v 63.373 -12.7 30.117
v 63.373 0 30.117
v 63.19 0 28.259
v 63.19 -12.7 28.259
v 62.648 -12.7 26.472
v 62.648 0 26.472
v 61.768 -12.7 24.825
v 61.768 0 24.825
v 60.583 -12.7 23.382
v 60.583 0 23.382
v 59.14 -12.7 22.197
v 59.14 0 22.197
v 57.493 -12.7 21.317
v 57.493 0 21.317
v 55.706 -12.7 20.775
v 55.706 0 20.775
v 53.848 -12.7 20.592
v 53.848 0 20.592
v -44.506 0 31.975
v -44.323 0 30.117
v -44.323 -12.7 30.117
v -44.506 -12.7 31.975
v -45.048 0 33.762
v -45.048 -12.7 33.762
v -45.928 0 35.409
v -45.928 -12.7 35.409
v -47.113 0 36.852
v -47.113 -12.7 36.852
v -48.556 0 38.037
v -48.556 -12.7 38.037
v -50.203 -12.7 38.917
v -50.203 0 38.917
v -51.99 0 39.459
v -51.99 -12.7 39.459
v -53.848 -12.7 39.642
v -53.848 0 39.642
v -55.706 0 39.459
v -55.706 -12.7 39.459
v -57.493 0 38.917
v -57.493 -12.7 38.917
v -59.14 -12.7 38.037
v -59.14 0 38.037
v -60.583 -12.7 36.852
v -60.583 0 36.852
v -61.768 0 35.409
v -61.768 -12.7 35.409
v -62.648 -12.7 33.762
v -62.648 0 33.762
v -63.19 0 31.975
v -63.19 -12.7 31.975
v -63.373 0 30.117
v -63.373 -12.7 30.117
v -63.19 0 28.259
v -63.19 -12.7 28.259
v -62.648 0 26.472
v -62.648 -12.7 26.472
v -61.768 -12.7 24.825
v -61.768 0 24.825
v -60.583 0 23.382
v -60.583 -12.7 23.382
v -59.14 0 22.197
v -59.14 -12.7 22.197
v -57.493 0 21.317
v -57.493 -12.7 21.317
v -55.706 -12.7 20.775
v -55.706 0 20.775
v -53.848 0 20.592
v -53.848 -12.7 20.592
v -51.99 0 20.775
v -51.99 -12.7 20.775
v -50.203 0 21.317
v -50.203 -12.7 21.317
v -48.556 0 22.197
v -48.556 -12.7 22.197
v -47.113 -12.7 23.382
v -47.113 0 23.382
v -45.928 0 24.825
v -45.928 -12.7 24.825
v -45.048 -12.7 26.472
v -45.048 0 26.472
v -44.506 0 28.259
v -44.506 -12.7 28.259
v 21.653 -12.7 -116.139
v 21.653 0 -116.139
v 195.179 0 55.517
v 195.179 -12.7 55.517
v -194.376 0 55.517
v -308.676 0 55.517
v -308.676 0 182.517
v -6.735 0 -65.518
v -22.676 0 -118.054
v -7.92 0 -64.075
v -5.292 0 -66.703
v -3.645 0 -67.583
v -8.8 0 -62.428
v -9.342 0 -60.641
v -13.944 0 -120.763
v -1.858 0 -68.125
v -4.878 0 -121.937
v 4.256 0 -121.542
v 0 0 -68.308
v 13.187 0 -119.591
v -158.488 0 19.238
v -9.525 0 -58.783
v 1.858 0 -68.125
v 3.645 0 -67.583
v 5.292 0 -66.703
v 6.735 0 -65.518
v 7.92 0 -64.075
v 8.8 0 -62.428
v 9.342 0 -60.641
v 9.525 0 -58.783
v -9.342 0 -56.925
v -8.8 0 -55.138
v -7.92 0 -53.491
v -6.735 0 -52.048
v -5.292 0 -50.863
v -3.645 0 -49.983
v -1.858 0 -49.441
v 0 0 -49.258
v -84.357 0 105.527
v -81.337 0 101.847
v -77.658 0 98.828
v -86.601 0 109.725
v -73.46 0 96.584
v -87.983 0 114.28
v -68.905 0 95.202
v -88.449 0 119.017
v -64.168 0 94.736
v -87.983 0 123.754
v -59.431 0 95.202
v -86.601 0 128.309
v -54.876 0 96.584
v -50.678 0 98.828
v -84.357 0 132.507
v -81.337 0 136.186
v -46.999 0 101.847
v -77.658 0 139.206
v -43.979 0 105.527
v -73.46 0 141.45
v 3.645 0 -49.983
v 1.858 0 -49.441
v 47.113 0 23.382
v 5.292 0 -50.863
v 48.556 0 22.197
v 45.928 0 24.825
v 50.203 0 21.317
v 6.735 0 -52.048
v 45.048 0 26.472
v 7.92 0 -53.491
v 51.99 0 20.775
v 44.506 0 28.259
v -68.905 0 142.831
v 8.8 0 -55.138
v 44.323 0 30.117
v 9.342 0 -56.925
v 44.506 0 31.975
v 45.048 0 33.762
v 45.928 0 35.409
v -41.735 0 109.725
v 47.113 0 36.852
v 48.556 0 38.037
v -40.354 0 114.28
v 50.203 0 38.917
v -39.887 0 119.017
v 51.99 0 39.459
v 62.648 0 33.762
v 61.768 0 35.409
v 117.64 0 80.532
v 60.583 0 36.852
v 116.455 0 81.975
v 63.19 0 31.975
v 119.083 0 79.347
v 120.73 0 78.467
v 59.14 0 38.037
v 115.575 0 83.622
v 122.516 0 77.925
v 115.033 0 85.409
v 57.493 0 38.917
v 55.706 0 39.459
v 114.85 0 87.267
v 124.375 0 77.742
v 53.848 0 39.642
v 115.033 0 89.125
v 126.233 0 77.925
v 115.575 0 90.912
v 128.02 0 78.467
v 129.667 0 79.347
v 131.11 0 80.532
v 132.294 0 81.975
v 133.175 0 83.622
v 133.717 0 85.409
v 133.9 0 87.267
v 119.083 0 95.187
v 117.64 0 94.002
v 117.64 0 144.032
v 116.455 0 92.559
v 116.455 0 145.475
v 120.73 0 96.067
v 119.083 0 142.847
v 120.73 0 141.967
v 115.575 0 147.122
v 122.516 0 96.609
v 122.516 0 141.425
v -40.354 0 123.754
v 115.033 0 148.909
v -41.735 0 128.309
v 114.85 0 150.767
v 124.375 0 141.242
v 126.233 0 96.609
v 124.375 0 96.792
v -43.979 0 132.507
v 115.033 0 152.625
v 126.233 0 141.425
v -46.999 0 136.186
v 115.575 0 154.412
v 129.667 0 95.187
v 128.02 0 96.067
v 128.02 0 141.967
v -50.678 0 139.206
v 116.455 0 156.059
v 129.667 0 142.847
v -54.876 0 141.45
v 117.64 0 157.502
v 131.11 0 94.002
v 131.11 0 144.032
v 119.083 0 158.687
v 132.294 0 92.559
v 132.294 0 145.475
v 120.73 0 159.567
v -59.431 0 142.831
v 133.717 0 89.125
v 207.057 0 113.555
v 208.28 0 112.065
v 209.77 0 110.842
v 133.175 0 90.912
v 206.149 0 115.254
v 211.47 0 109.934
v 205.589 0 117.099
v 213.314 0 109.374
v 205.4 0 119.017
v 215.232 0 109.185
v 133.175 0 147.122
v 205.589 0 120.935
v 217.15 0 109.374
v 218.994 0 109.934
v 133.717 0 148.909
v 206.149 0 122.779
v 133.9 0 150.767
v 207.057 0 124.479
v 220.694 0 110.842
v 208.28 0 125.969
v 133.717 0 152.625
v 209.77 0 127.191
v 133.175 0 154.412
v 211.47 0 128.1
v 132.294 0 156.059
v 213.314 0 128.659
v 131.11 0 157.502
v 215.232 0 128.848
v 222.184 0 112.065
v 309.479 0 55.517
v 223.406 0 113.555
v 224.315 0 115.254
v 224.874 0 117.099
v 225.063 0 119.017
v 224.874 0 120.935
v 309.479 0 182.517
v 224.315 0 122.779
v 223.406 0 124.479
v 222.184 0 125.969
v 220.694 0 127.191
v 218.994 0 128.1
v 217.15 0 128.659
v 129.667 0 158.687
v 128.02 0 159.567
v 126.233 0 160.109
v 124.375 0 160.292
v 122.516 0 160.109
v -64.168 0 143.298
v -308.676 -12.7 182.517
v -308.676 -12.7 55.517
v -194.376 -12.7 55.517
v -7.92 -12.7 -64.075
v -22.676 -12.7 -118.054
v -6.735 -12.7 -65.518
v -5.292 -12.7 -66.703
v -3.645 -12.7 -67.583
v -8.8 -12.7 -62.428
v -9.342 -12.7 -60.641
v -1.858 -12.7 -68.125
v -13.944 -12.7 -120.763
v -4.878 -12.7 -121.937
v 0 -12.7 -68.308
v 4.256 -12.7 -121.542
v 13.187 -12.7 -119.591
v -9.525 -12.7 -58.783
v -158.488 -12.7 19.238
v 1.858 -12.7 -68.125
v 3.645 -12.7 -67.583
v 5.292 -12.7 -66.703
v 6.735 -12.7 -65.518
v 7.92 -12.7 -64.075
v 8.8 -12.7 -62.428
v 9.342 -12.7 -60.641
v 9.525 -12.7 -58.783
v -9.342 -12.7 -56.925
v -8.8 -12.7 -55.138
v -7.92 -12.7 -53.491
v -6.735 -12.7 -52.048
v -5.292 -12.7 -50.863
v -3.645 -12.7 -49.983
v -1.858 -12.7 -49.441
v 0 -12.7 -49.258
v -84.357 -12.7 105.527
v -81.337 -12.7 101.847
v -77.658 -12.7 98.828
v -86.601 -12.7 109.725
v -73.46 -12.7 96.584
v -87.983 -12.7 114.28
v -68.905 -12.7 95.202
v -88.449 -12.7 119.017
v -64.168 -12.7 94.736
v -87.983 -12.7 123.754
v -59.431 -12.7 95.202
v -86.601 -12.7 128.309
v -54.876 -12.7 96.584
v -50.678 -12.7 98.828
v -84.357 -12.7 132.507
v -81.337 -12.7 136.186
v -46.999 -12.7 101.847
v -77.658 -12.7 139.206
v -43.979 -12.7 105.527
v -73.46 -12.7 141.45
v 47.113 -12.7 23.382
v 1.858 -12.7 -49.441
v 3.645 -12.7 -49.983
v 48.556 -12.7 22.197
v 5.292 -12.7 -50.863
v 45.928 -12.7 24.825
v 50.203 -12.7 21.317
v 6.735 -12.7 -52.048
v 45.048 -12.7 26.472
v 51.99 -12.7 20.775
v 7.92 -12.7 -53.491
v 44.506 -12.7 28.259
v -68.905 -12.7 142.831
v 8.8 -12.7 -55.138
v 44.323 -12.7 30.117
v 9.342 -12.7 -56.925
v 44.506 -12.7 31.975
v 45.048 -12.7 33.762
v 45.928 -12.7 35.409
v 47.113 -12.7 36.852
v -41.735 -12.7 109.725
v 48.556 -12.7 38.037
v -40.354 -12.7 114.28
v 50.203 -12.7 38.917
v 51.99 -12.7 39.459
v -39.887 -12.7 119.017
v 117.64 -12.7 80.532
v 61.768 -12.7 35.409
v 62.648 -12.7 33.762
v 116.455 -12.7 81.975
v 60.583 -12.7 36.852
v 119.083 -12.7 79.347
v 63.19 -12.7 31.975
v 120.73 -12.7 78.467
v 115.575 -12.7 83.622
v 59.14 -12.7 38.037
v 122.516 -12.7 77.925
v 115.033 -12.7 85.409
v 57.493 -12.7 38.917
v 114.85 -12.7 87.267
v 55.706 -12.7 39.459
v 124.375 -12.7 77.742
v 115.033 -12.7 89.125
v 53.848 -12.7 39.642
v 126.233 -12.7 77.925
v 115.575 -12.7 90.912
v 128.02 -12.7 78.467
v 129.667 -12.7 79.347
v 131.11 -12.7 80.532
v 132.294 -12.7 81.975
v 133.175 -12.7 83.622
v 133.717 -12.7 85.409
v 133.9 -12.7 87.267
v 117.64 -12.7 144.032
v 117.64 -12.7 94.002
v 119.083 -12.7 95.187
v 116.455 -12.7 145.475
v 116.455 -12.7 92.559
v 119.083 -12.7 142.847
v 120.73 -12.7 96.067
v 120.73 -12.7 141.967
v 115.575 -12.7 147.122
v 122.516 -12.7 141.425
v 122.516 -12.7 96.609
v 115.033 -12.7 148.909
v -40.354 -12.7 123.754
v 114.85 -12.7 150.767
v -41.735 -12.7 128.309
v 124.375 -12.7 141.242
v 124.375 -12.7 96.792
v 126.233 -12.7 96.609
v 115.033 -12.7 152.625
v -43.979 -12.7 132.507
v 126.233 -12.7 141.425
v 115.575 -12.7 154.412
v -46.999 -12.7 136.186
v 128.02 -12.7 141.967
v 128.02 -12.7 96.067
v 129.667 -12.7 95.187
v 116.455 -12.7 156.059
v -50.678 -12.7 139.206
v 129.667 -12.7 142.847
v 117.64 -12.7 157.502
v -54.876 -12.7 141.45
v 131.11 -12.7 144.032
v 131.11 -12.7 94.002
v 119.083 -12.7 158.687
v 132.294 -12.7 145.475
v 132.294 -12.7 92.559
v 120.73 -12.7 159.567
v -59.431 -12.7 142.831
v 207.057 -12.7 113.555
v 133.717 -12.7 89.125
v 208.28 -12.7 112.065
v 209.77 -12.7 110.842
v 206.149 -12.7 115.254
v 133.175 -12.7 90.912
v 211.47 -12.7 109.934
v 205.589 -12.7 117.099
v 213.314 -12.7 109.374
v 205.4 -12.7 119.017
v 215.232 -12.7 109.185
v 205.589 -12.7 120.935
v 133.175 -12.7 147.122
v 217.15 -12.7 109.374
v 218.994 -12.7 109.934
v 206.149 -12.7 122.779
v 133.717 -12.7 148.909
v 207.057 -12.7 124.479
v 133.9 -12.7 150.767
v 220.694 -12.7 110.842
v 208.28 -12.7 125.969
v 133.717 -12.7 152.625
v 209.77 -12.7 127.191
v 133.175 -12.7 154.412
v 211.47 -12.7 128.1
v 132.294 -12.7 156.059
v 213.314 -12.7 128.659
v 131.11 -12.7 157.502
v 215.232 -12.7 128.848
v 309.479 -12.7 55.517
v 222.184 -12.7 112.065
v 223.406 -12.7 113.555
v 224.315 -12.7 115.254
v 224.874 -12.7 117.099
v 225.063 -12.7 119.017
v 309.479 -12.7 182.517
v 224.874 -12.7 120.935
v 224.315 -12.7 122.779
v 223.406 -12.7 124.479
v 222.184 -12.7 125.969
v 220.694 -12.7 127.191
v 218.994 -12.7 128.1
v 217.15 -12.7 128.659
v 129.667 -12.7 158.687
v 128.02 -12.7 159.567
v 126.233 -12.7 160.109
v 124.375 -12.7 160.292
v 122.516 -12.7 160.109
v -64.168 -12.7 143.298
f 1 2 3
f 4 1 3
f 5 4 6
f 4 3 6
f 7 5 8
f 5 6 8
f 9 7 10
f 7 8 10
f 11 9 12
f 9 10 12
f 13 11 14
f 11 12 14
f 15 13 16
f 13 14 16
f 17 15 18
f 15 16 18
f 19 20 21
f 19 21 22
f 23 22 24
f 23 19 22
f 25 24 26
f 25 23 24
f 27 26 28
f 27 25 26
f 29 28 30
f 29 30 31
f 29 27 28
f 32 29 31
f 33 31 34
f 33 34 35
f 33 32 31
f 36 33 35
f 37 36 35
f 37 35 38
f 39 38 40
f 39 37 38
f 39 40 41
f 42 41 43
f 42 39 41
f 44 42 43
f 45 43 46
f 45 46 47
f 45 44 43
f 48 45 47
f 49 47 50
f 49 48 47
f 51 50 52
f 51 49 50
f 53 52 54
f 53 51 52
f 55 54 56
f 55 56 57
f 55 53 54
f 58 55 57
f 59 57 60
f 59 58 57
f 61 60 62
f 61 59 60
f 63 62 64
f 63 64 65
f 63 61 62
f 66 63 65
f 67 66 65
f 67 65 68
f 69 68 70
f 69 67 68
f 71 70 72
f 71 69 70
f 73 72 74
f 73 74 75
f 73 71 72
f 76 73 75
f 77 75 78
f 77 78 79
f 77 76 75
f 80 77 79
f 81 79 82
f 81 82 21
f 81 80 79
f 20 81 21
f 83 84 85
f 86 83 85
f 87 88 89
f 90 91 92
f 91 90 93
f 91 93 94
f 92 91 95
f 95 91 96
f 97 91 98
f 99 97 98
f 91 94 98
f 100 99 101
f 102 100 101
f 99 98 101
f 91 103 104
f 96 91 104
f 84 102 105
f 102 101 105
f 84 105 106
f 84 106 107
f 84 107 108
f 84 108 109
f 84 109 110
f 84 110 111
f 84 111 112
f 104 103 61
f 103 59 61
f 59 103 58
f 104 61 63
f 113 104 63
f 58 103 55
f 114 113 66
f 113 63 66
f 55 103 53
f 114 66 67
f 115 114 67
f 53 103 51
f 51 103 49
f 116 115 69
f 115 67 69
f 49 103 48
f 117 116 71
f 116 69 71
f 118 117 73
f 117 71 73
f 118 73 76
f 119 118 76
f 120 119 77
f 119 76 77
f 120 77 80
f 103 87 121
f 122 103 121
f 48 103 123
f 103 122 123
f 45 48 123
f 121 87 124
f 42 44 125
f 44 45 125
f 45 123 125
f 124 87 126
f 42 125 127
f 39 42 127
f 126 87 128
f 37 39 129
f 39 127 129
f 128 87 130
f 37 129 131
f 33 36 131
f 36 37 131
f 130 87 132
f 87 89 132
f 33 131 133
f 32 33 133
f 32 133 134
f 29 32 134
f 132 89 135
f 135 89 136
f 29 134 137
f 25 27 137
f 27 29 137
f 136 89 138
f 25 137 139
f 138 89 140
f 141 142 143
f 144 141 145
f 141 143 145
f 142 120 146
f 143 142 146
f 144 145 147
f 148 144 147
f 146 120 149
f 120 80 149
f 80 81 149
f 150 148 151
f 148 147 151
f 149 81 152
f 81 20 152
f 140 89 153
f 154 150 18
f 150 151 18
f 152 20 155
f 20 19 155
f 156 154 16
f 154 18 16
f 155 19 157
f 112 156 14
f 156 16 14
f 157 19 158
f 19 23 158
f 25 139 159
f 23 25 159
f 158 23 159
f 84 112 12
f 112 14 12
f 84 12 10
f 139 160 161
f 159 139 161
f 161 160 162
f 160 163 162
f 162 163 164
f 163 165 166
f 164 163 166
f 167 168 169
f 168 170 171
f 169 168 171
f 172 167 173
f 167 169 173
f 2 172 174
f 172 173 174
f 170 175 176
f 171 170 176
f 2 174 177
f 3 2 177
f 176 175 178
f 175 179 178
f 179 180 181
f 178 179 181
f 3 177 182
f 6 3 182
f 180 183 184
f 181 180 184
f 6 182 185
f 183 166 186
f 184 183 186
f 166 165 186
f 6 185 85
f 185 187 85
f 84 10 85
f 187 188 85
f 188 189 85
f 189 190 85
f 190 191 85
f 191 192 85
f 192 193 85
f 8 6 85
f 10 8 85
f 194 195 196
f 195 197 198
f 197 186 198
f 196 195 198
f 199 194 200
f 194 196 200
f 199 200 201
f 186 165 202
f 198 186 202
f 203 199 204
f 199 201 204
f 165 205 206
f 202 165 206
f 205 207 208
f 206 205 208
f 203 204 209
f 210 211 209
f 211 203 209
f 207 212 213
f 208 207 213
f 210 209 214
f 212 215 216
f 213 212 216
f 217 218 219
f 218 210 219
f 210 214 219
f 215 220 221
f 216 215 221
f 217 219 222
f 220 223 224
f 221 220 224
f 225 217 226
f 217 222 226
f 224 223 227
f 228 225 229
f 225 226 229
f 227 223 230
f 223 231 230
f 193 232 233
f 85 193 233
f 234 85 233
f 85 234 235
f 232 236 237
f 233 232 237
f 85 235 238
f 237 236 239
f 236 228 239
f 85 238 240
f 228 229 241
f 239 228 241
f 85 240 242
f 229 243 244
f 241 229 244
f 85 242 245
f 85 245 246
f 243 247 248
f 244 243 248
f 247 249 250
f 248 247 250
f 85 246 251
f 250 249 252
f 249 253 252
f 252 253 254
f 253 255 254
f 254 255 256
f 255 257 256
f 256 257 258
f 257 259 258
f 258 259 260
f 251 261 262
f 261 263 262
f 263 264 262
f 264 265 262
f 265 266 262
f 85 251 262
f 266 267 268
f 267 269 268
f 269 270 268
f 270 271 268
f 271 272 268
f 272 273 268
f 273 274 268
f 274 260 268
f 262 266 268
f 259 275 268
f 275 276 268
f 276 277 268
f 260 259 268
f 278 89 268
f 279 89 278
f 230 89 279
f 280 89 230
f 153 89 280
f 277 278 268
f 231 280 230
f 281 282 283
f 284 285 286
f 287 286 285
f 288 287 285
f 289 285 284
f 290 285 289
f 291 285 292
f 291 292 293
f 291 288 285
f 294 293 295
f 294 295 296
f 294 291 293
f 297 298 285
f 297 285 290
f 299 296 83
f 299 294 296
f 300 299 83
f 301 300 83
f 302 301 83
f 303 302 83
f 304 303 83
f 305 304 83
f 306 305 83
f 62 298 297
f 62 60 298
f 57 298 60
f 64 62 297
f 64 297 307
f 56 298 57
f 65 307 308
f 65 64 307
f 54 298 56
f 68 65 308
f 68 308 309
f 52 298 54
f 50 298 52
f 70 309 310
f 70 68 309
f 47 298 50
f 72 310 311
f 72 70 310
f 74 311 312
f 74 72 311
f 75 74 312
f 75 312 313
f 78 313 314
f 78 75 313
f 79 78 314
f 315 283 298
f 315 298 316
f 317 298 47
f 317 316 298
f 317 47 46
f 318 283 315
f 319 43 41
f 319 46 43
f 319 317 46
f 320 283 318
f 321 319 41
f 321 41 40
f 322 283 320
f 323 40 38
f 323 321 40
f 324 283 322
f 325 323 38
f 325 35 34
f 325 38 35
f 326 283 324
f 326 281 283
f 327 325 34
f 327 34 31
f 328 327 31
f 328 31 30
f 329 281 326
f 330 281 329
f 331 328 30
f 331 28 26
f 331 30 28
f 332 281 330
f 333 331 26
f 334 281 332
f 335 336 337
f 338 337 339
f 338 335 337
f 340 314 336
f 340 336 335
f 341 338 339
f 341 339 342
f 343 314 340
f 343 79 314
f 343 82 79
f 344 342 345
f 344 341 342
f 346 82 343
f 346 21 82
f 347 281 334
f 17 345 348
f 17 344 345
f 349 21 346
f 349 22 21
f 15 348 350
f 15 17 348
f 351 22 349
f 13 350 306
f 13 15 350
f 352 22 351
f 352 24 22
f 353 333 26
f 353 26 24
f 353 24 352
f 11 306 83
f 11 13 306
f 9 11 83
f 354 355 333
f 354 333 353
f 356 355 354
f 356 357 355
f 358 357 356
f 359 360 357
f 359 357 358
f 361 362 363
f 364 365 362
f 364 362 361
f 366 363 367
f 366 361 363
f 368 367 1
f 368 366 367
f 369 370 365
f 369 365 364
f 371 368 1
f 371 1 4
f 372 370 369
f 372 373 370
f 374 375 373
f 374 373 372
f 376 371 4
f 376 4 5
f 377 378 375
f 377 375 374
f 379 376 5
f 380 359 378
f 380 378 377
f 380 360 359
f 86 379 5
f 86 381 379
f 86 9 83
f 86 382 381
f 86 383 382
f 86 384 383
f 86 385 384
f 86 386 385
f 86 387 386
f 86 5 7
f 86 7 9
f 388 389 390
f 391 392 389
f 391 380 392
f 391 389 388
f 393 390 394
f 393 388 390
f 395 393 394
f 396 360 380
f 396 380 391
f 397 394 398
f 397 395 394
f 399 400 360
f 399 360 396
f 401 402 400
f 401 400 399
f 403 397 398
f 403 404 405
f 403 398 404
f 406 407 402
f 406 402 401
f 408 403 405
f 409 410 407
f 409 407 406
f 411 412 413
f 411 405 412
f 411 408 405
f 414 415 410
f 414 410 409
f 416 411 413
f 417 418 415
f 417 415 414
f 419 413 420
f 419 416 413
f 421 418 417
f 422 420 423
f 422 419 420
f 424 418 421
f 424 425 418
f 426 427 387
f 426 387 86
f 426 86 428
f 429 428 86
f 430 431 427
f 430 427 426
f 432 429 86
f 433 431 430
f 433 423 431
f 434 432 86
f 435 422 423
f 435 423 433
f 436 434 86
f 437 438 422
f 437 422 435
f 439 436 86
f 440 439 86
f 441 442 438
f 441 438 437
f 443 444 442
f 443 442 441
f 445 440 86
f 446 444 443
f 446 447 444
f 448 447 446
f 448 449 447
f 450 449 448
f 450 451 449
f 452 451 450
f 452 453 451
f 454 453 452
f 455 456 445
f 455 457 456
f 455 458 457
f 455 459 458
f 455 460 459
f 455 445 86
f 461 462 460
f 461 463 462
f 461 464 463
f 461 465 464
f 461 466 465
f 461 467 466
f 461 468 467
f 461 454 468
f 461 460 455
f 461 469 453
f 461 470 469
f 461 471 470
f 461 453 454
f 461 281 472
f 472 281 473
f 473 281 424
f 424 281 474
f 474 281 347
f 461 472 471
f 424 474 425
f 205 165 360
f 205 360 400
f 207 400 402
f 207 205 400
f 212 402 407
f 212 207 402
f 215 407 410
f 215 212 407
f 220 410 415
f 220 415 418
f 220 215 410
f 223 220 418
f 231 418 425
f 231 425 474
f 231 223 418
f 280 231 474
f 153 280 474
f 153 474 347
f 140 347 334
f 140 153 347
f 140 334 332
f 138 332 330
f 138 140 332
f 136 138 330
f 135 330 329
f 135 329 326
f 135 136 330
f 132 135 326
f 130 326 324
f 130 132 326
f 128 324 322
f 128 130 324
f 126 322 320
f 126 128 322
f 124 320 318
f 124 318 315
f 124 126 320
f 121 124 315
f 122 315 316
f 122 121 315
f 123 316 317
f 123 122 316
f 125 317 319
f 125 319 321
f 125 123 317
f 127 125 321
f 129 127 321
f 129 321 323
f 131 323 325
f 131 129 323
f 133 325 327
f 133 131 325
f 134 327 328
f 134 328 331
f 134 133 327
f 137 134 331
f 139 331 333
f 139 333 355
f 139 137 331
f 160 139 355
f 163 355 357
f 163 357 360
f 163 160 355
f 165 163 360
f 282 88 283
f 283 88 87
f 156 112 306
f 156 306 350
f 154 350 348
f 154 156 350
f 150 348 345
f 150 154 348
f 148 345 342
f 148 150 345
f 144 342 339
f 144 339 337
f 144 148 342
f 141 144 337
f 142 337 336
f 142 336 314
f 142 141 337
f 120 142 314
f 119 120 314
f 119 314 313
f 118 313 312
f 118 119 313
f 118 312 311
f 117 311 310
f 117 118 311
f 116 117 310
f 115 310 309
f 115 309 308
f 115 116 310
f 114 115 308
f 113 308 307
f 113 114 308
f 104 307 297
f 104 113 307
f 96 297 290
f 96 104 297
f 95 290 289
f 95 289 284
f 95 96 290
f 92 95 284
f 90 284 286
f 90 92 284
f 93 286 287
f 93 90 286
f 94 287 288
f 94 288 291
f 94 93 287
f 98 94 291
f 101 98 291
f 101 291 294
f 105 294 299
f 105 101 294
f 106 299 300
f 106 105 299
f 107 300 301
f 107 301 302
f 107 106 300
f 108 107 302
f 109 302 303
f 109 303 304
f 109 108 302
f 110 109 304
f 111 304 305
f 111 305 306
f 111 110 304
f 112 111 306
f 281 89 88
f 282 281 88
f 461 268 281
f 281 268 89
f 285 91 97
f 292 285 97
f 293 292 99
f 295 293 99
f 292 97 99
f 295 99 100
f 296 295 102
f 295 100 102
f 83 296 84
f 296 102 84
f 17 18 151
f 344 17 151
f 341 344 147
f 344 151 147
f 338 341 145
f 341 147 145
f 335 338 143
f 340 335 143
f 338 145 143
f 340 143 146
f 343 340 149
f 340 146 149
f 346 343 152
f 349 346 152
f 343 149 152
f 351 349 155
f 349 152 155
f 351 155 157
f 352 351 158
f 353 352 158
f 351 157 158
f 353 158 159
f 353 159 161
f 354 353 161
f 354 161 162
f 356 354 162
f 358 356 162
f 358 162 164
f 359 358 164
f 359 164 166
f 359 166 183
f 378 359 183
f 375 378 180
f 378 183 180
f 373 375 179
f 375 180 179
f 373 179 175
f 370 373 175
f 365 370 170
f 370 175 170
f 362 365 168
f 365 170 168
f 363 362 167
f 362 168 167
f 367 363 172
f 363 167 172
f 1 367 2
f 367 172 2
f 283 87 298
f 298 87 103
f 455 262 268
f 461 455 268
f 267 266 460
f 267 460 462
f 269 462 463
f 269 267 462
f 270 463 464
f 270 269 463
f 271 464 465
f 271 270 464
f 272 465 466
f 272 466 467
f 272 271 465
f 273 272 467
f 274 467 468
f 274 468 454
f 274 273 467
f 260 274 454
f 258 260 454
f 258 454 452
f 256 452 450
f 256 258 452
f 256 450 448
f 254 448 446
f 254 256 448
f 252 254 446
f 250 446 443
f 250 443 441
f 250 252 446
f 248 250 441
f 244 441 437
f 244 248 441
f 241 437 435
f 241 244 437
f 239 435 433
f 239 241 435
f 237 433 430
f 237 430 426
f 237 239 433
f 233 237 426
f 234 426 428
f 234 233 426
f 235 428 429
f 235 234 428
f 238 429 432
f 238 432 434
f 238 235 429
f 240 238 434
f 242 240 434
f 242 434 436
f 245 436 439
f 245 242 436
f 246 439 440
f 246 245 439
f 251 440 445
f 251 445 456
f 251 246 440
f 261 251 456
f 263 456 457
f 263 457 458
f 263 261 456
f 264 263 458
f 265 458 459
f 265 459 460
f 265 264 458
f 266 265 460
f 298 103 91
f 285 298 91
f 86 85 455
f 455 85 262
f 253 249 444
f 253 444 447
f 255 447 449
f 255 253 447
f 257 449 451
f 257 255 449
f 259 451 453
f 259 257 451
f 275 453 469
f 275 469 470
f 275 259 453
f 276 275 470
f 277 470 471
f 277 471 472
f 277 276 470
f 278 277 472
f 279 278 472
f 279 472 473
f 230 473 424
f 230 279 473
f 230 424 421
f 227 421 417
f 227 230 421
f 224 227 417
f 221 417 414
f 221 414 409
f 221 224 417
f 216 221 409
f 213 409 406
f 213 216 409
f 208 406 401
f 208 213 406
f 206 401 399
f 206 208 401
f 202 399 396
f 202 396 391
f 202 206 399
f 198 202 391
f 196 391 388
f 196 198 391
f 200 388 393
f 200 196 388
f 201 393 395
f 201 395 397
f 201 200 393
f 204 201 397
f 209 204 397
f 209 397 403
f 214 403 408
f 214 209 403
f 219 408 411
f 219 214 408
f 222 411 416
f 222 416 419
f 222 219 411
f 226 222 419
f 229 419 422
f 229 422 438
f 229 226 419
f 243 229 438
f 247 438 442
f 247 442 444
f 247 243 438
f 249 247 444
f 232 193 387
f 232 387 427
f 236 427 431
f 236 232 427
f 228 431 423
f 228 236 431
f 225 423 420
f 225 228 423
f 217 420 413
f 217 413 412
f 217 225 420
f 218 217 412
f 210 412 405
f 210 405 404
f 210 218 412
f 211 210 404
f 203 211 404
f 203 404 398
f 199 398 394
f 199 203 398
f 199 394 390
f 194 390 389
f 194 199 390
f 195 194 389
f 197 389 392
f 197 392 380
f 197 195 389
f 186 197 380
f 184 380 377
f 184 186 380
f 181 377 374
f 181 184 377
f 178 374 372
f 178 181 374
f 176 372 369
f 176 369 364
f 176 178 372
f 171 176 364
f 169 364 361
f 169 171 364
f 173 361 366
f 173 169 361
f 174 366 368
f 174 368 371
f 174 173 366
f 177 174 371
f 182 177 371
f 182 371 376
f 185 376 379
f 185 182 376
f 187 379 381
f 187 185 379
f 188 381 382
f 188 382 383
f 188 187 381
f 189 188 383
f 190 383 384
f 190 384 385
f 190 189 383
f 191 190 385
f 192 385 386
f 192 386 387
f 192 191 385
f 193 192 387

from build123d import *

# Parameters (mm, degrees)
F0_R     = 9.525
F0_R_2   = 24.281079
F0_R_3   = 9.831352
F1_DEPTH = 12.7


with BuildPart() as f1:
    # F0 (on Front) → F1 (new body)
    with BuildSketch(Plane.XZ):
        with BuildLine():
            Line((-308.675736, 182.516785), (-308.675736, 55.516785))
            Line((-308.675736, 55.516785), (-194.375736, 55.516785))
            Line((-194.375736, 55.516785), (-158.488057, 19.238039))
            Line((-158.488057, 19.238039), (-22.676105, -118.053854))
            ThreePointArc((-22.676105, -118.053854), (-0.30253, -121.93622), (21.652907, -116.138945))
            Line((21.652907, -116.138945), (195.179168, 55.516785))
            Line((195.179168, 55.516785), (309.479168, 55.516785))
            Line((309.479168, 55.516785), (309.479168, 182.516785))
            Line((309.479168, 182.516785), (-308.675736, 182.516785))
        make_face()
        with Locations((-53.848, 30.116785)):
            Circle(F0_R, mode=Mode.SUBTRACT)
        with Locations((0, -58.783215)):
            Circle(F0_R, mode=Mode.SUBTRACT)
        with BuildLine():
            ThreePointArc((53.848, 20.591785), (47.112808, 36.851977), (63.373, 30.116785))
            ThreePointArc((63.373, 30.116785), (60.583192, 23.381593), (53.848, 20.591785))
        make_face(mode=Mode.SUBTRACT)
        with Locations((-64.168158, 119.016785)):
            Circle(F0_R_2, mode=Mode.SUBTRACT)
        with Locations((124.374732, 87.266785)):
            Circle(F0_R, mode=Mode.SUBTRACT)
        with Locations((124.374732, 150.766785)):
            Circle(F0_R, mode=Mode.SUBTRACT)
        with Locations((215.231842, 119.016785)):
            Circle(F0_R_3, mode=Mode.SUBTRACT)
    extrude(amount=F1_DEPTH)


solid = f1.part
